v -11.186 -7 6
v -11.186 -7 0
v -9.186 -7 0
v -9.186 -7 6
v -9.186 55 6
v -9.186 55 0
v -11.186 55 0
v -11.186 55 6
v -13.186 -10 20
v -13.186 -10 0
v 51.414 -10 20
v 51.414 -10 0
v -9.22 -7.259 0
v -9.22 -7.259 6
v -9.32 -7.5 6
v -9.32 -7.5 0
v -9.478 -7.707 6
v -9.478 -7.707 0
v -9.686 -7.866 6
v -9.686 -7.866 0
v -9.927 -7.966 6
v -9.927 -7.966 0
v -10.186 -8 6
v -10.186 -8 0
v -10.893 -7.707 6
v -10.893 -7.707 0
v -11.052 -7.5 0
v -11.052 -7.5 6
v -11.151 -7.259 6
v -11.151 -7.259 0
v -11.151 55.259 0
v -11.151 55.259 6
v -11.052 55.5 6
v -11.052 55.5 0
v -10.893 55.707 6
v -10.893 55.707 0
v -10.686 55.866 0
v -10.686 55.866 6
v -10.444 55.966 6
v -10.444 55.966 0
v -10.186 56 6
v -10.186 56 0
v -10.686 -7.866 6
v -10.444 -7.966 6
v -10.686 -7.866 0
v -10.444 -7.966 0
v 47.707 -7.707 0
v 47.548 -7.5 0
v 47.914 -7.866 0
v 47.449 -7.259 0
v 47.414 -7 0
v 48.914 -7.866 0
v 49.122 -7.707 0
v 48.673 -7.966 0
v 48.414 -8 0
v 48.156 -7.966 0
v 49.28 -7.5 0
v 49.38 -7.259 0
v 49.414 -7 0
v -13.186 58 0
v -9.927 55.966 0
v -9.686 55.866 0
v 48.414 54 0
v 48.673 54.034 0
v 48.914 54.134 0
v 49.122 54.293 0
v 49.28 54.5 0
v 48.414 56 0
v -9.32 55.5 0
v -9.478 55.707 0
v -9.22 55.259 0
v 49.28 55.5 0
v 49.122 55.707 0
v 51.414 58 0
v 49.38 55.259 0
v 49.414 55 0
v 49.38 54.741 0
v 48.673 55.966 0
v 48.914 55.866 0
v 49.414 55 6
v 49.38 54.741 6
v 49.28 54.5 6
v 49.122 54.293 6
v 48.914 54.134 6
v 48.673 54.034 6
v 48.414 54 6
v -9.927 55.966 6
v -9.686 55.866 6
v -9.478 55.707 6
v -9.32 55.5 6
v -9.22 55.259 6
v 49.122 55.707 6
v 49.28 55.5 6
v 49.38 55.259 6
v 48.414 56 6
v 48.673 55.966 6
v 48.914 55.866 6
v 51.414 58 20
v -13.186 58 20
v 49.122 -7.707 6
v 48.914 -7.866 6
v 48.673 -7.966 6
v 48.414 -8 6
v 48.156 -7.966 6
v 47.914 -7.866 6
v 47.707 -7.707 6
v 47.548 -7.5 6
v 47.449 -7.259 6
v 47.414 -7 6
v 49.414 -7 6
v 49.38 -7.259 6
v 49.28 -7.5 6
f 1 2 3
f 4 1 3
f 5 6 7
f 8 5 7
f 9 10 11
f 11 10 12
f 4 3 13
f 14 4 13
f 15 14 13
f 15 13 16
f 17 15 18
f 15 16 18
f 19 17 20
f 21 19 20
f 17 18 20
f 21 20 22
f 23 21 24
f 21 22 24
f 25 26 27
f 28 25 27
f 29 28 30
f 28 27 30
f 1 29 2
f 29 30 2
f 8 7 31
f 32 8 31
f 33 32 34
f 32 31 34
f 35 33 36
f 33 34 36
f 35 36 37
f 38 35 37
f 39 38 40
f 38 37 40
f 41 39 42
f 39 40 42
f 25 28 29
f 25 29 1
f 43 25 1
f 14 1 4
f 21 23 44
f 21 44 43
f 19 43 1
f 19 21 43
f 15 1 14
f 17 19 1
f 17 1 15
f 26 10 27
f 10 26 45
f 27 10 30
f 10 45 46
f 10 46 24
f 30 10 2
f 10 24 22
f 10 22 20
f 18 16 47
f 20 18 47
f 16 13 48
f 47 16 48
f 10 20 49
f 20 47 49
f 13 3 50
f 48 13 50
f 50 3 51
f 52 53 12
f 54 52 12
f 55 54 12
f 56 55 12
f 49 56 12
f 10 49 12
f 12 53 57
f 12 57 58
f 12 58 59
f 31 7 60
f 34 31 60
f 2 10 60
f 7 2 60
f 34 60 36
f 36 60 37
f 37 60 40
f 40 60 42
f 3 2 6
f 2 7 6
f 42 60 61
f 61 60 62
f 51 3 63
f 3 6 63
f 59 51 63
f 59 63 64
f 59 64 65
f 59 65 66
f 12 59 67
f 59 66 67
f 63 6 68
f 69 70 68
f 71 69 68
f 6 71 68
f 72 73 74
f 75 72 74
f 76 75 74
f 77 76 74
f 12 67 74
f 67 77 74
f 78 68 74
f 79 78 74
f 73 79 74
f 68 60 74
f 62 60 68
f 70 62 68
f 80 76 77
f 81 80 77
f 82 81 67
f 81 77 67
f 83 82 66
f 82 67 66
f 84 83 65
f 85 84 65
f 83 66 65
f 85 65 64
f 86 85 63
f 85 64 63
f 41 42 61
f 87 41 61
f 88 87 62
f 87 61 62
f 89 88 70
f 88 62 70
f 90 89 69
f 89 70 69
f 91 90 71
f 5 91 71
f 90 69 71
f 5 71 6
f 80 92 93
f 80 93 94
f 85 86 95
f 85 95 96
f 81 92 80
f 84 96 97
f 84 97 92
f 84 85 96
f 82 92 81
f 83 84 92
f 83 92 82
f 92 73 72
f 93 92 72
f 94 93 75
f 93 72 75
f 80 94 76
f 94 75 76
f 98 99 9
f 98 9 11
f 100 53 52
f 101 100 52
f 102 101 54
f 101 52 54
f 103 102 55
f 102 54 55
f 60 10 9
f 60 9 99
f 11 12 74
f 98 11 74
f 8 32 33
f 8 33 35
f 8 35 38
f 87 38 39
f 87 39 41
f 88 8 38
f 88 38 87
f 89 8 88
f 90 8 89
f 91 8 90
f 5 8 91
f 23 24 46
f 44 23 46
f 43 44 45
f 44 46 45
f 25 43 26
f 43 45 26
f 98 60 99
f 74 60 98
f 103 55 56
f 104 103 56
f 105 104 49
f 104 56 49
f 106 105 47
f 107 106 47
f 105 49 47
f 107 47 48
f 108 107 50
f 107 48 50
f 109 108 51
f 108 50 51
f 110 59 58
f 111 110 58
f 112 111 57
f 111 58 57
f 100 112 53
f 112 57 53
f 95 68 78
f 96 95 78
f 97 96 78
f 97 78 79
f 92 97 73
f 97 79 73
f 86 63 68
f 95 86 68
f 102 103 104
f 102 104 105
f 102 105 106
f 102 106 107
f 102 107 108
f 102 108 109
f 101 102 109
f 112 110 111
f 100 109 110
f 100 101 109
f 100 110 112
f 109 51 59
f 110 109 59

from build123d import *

# Parameters (mm, degrees)
F0_W     = 64.6
F0_H     = 68
F1_DEPTH = 20
F3_DEPTH = 6


with BuildPart() as f1:
    # F0 (on Top) → F1 (new body)
    with BuildSketch(Plane.XY):
        with Locations((19.1144577392, 24)):
            Rectangle(F0_W, F0_H)
    extrude(amount=F1_DEPTH)

    # F2 (on face) → F3 (cut)
    with BuildSketch(Plane(origin=(0, 0, 0), x_dir=(1, 0, 0), z_dir=(0, 0, -1))):
        with BuildLine():
            ThreePointArc((48.4144577392, 8), (47.707350958, 7.7071067812), (47.4144577392, 7))
            Line((47.4144577392, 7), (48.4144577392, 7))
            Line((48.4144577392, 7), (48.4144577392, 8))
        make_face()
        with BuildLine():
            ThreePointArc((49.1215645203, 7.7071067812), (48.7971411715, 7.9238795325), (48.4144577392, 8))
            Line((48.4144577392, 8), (48.4144577392, 7))
            Line((48.4144577392, 7), (49.1215645203, 7.7071067812))
        make_face()
        with BuildLine():
            Line((49.1215645203, 7.7071067812), (48.4144577392, 7))
            Line((48.4144577392, 7), (49.4144577392, 7))
            ThreePointArc((49.4144577392, 7), (49.3383372717, 7.3826834324), (49.1215645203, 7.7071067812))
        make_face()
        with BuildLine():
            ThreePointArc((49.4144577392, -55), (49.1215645203, -54.2928932188), (48.4144577392, -54))
            Line((48.4144577392, -54), (48.4144577392, -55))
            Line((48.4144577392, -55), (49.4144577392, -55))
        make_face()
        with BuildLine():
            ThreePointArc((49.1215645203, -55.7071067812), (49.3383372717, -55.3826834324), (49.4144577392, -55))
            Line((49.4144577392, -55), (48.4144577392, -55))
            Line((48.4144577392, -55), (49.1215645203, -55.7071067812))
        make_face()
        with BuildLine():
            Line((48.4144577392, -55), (48.4144577392, -56))
            ThreePointArc((48.4144577392, -56), (48.7971411715, -55.9238795325), (49.1215645203, -55.7071067812))
            Line((49.1215645203, -55.7071067812), (48.4144577392, -55))
        make_face()
        with BuildLine():
            Line((-10.1855422608, 7), (-9.1855422608, 7))
            ThreePointArc((-9.1855422608, 7), (-9.4784354797, 7.7071067812), (-10.1855422608, 8))
            Line((-10.1855422608, 8), (-10.1855422608, 7))
        make_face()
        with BuildLine():
            Line((-10.1855422608, 7), (-10.1855422608, 8))
            ThreePointArc((-10.1855422608, 8), (-10.5682256932, 7.9238795325), (-10.892649042, 7.7071067812))
            Line((-10.892649042, 7.7071067812), (-10.1855422608, 7))
        make_face()
        with BuildLine():
            Line((-11.1855422608, 7), (-10.1855422608, 7))
            Line((-10.1855422608, 7), (-10.892649042, 7.7071067812))
            ThreePointArc((-10.892649042, 7.7071067812), (-11.1094217934, 7.3826834324), (-11.1855422608, 7))
        make_face()
        with BuildLine():
            ThreePointArc((-10.1855422608, -56), (-9.4784354797, -55.7071067812), (-9.1855422608, -55))
            Line((-9.1855422608, -55), (-10.1855422608, -55))
            Line((-10.1855422608, -55), (-10.1855422608, -56))
        make_face()
        with BuildLine():
            Line((-10.1855422608, -56), (-10.1855422608, -55))
            Line((-10.1855422608, -55), (-10.892649042, -55.7071067812))
            ThreePointArc((-10.892649042, -55.7071067812), (-10.5682256932, -55.9238795325), (-10.1855422608, -56))
        make_face()
        with BuildLine():
            Line((-10.1855422608, -55), (-11.1855422608, -55))
            ThreePointArc((-11.1855422608, -55), (-11.1094217934, -55.3826834324), (-10.892649042, -55.7071067812))
            Line((-10.892649042, -55.7071067812), (-10.1855422608, -55))
        make_face()
    extrude(amount=-F3_DEPTH, mode=Mode.SUBTRACT)


solid = f1.part
